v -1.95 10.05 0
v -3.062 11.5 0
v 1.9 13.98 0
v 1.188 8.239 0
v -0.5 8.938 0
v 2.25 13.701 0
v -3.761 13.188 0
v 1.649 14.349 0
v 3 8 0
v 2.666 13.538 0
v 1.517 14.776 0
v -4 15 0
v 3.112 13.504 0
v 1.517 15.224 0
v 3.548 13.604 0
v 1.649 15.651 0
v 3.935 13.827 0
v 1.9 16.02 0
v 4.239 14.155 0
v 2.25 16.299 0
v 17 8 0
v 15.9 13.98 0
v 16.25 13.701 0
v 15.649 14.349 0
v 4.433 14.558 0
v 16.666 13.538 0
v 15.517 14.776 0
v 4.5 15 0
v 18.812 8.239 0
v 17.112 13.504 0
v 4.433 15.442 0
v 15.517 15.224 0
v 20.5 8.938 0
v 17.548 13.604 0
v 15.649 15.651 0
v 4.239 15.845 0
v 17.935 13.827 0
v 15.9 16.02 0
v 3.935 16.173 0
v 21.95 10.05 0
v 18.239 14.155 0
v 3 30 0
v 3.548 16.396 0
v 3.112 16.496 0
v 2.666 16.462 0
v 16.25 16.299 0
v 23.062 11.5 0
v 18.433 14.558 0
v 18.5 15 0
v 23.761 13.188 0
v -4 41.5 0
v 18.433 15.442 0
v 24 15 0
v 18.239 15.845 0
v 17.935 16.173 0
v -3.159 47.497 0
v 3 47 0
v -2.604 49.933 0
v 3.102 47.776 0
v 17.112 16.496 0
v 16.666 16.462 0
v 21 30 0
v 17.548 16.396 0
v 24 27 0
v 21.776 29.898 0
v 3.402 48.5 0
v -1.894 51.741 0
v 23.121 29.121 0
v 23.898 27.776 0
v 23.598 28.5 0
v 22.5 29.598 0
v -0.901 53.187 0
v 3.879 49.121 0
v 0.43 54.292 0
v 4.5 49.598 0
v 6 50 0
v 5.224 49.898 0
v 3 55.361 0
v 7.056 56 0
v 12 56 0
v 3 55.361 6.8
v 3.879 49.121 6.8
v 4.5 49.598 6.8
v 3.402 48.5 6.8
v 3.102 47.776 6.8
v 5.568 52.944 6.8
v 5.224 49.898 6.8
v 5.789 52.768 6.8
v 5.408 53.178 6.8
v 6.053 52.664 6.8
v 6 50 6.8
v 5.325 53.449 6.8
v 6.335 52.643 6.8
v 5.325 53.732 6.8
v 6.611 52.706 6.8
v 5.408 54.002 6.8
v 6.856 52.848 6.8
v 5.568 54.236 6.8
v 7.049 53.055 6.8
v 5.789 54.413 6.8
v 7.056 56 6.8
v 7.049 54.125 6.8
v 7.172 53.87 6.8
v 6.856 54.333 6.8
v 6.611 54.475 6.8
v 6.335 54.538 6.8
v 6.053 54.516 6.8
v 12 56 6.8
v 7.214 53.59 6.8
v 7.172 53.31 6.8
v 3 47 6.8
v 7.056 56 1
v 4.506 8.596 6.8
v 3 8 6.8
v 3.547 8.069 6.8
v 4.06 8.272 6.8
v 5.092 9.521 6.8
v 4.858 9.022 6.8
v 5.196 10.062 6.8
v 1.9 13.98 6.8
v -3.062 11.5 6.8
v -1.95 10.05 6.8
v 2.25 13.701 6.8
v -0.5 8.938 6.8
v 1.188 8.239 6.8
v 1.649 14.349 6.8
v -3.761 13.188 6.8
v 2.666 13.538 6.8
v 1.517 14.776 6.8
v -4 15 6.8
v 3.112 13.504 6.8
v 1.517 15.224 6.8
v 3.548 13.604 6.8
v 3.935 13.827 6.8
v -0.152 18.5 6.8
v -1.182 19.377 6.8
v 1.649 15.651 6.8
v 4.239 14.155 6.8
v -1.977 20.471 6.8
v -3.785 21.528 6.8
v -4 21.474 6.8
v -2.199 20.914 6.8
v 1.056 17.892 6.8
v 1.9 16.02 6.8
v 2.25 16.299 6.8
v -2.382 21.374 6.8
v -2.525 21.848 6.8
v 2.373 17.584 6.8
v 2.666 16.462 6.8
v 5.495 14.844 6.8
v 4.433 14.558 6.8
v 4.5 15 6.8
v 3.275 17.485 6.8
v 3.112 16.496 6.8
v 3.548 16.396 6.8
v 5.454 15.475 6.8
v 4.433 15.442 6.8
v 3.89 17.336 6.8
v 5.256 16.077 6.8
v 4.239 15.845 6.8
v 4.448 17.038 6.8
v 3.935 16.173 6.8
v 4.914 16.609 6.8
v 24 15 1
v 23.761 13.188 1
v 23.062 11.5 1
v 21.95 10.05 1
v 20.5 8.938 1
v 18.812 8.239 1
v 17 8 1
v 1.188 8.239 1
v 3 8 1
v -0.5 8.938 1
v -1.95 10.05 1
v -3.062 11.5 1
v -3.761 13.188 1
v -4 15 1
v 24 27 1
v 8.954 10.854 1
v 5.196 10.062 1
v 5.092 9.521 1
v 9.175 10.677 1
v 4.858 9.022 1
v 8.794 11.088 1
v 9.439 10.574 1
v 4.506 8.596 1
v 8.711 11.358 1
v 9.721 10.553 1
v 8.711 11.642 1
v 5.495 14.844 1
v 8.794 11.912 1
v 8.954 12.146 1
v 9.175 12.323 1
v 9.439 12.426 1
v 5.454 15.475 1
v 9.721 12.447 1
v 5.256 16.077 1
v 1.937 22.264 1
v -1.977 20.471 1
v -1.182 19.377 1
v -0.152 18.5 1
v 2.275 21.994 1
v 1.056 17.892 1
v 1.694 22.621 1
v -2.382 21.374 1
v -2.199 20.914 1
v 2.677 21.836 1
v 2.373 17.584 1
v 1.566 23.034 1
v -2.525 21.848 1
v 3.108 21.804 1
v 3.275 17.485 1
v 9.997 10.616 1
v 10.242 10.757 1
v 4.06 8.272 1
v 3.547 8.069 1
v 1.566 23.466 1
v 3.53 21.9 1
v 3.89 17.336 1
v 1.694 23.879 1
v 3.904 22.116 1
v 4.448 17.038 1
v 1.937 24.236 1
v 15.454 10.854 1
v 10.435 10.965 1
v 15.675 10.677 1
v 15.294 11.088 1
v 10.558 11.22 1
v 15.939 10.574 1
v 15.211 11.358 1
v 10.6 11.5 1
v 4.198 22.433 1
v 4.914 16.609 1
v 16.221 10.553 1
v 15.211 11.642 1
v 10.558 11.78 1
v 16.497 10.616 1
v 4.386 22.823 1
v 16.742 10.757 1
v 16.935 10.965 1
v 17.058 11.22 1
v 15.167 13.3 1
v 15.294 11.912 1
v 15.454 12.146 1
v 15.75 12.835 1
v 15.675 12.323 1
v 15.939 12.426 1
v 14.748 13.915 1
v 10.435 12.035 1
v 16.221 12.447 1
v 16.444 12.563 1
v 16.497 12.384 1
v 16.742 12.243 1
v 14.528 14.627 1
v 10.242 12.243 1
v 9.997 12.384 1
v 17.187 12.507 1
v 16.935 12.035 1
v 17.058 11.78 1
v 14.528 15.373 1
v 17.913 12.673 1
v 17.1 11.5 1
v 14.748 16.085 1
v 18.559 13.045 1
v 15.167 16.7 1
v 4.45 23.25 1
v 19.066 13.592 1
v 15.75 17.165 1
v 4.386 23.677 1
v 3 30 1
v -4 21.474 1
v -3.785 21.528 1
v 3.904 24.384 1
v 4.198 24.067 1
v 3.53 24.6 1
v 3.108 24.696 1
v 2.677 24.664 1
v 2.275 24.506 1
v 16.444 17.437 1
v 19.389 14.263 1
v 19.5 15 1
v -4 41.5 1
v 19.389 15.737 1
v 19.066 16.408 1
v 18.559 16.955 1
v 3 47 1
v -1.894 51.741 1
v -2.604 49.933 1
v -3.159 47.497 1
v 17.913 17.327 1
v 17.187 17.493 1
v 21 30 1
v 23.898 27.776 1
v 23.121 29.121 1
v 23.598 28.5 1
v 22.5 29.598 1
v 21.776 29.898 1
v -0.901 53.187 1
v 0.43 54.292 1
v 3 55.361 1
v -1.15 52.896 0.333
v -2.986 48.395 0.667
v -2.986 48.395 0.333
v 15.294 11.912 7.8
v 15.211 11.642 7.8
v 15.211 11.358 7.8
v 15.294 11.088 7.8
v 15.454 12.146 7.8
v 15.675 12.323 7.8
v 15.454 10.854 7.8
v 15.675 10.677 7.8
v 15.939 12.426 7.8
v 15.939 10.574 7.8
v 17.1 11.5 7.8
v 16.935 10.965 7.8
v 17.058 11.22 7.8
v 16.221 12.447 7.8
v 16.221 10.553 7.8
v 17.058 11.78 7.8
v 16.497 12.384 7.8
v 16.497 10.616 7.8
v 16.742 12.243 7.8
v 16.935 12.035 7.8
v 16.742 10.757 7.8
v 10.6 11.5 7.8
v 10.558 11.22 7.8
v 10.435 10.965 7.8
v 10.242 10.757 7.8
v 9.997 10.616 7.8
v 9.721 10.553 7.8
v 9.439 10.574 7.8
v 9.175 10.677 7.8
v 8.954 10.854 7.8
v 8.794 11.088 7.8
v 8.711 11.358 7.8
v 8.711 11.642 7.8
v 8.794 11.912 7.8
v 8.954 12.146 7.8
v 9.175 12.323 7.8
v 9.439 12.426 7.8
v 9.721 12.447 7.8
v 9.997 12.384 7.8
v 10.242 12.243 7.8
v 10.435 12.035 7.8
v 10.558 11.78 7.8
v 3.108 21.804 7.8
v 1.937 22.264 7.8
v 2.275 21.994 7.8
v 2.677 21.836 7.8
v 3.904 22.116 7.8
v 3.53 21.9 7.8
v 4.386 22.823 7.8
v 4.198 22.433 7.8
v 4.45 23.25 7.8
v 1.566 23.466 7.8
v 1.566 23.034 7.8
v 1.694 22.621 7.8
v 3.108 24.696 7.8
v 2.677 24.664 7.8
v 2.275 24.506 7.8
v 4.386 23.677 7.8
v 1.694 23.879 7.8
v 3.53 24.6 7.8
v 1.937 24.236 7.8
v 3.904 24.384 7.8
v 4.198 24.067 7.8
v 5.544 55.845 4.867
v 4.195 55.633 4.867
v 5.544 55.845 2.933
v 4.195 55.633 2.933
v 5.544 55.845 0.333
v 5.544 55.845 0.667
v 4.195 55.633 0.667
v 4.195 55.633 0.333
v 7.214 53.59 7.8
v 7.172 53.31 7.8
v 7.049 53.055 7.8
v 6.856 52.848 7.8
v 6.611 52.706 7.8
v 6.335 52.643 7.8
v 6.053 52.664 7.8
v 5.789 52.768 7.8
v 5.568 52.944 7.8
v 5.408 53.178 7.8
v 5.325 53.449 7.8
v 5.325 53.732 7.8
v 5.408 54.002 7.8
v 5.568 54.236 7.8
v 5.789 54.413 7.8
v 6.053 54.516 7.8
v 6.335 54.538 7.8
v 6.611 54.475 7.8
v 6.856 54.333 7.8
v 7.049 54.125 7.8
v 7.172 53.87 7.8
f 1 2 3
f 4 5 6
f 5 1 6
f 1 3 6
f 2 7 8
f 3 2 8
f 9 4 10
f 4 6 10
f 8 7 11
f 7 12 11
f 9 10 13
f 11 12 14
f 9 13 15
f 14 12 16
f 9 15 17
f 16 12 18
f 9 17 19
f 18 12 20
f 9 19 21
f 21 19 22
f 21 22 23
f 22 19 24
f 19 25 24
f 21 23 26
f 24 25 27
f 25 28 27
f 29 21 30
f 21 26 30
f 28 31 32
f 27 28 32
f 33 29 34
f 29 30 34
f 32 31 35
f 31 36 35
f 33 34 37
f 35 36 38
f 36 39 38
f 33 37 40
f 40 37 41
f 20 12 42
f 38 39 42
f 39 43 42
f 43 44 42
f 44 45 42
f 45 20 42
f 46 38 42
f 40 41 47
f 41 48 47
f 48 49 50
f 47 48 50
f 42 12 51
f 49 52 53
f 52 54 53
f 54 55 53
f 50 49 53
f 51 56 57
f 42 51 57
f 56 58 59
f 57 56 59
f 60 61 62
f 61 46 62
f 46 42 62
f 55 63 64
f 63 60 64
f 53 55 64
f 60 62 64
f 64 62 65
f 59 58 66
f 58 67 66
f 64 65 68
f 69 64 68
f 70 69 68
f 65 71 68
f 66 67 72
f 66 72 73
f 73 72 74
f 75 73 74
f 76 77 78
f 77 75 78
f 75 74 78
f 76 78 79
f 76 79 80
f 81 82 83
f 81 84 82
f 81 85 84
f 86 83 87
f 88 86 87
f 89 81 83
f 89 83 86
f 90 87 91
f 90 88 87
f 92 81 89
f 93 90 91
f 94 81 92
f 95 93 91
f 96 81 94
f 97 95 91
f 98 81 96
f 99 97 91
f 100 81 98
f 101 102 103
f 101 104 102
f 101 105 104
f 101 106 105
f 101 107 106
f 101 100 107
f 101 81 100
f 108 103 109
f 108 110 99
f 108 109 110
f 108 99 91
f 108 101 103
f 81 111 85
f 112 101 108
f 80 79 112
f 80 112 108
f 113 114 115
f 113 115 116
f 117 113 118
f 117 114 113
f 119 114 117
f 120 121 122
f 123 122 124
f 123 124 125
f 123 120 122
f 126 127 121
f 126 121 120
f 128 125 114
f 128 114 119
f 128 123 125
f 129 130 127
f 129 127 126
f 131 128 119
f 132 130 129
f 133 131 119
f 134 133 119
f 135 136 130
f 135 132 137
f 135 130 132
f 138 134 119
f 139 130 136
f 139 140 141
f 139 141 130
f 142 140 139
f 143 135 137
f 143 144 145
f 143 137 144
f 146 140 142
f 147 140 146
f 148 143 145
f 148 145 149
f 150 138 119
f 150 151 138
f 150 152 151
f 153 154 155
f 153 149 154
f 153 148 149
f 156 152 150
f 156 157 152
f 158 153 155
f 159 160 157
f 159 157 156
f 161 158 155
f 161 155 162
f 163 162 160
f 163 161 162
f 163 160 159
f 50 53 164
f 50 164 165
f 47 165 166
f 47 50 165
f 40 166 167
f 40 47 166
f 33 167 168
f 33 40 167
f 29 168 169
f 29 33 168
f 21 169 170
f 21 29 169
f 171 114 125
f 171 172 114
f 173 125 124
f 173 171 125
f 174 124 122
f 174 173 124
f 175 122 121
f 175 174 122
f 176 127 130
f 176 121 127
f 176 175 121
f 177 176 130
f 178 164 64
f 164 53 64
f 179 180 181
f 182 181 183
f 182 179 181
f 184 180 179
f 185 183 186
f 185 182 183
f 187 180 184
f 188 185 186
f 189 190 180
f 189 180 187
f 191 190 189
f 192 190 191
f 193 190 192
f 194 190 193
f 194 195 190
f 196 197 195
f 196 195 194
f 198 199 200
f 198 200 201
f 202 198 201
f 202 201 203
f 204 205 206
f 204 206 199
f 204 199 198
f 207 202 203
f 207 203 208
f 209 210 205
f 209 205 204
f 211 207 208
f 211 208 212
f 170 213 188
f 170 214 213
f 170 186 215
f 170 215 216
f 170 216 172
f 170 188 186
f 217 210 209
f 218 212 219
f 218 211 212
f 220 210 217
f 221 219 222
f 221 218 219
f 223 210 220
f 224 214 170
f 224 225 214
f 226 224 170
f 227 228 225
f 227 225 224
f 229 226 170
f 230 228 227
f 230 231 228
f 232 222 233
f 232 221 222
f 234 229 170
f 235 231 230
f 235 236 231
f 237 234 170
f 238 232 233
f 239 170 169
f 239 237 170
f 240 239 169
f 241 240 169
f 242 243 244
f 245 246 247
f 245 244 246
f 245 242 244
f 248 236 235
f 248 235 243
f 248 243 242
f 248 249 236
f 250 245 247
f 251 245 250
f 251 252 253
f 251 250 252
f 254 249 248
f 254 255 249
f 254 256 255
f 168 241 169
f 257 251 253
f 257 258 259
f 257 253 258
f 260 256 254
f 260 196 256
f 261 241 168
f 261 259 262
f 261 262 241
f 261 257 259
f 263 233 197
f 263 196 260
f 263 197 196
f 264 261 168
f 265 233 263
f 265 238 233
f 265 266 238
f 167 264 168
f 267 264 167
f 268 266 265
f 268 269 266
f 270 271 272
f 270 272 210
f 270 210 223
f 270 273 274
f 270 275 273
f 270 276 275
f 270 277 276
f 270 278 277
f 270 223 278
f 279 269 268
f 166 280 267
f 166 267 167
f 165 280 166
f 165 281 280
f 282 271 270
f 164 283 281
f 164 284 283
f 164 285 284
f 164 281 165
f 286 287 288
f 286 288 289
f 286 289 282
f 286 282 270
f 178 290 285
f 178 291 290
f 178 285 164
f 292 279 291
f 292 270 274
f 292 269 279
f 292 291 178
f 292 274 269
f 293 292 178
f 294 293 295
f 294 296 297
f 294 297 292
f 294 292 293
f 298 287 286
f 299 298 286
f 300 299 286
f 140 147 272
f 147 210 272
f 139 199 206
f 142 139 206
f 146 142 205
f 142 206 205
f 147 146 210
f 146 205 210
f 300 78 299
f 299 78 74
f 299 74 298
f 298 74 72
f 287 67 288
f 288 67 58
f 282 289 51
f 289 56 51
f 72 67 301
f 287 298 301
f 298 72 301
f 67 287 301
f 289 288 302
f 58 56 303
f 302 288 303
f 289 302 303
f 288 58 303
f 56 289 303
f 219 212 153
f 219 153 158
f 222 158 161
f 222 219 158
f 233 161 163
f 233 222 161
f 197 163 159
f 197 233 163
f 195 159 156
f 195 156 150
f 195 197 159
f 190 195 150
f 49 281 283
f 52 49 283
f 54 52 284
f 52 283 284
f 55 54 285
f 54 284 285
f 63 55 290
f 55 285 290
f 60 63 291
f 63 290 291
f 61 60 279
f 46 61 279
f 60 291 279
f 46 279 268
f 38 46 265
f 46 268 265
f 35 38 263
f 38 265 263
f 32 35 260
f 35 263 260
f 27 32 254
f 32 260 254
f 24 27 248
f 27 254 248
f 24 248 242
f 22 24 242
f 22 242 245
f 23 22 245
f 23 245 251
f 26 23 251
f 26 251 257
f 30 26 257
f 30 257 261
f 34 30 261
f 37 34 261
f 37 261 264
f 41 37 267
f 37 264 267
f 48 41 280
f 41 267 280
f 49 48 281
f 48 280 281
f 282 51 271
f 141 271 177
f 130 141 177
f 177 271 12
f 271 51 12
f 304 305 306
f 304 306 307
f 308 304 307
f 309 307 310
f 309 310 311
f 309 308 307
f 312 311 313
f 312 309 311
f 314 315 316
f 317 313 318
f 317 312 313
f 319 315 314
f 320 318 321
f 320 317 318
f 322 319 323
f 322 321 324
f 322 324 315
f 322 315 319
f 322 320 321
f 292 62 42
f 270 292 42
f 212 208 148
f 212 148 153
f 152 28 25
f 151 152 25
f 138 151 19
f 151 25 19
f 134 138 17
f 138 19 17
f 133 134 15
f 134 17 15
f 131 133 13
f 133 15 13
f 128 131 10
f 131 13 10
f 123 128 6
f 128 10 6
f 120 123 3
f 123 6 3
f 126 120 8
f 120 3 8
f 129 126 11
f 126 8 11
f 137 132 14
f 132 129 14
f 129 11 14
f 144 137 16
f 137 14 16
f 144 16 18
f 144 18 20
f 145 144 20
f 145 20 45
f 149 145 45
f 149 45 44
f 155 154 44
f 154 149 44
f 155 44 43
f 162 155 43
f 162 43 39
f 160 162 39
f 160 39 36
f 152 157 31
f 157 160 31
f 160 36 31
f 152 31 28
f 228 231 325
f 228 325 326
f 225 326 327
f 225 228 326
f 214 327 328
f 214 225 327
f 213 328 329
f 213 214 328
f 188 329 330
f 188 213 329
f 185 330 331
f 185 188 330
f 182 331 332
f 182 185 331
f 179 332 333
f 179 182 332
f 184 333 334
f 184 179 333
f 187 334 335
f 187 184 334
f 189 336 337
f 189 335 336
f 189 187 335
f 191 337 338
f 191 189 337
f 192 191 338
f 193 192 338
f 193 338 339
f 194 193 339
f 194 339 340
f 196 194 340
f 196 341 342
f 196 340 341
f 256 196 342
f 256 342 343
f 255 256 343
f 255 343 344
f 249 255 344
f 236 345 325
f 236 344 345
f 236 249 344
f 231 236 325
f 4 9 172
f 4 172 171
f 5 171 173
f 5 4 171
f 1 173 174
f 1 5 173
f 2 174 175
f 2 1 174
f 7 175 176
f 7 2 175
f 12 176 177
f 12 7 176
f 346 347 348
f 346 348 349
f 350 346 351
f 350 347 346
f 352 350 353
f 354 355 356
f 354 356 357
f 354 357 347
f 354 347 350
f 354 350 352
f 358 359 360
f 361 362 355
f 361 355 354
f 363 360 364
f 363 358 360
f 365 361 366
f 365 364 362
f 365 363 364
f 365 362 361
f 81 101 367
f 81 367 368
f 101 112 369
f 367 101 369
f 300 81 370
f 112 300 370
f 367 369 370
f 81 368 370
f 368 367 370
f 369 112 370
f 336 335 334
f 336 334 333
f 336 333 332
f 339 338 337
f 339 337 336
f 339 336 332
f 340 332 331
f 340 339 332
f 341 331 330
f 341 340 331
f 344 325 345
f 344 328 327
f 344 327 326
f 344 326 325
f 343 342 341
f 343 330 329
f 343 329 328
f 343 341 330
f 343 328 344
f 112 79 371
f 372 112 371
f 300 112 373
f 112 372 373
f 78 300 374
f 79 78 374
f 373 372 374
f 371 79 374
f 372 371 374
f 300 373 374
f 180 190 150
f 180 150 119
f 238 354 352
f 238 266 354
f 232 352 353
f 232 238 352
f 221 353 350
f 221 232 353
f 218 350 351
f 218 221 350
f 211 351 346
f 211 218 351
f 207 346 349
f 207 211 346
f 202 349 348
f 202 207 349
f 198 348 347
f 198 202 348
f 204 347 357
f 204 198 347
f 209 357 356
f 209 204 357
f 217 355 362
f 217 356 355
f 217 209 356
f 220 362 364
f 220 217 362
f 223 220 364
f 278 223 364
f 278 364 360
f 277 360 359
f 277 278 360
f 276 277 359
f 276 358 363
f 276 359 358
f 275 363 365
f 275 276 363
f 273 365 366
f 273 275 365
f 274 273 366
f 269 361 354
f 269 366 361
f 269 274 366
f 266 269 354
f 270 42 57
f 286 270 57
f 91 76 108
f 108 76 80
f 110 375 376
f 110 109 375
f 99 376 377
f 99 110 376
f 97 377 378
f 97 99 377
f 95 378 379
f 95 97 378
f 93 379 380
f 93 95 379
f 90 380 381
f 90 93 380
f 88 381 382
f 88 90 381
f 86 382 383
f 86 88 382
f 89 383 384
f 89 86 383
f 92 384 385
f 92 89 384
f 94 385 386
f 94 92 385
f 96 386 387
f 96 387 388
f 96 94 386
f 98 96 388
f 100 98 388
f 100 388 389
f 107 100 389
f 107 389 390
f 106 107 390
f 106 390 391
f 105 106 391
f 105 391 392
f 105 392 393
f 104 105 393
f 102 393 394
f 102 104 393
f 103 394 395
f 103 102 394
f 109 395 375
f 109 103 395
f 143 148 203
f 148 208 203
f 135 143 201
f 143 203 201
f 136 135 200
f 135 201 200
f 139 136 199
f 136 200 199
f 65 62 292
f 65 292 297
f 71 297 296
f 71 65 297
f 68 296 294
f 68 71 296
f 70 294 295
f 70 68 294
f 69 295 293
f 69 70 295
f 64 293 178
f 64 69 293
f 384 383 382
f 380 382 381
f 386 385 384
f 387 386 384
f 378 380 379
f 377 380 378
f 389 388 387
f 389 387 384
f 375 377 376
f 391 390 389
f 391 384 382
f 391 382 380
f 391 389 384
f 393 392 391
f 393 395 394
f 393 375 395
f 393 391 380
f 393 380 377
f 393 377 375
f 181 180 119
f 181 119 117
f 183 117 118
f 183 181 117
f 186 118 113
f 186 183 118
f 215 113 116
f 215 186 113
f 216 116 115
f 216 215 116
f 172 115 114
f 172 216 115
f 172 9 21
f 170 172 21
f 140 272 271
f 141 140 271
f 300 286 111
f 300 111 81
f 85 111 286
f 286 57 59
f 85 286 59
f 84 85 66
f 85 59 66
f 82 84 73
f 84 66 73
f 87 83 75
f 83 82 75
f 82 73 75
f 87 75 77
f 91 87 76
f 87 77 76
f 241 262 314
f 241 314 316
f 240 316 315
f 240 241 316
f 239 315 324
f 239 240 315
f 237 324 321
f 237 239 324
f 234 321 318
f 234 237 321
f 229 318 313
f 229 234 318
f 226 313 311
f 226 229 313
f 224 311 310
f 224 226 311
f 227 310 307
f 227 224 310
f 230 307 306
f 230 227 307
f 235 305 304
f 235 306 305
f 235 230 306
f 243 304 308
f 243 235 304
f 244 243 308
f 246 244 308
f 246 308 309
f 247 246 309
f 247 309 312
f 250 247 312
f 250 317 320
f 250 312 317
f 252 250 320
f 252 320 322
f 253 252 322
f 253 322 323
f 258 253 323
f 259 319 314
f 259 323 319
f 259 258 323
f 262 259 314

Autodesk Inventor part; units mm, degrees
sketch "Эскиз1" plane through (0, 0, 0) normal (0, 0, 1) x (1, 0, 0)
  line L0 (177.53, 10) -> (177.53, -9.022) projected
  line L1 (177.53, -9.022) -> (165.53, -9.022) projected
  line L2 (165.53, -9.022) -> (165.53, 10) projected
  line L3 (165.53, 10) -> (177.53, 10) projected
  line L4 (165.53, -76) -> (165.53, -56.978) projected
  line L5 (165.53, -56.978) -> (177.53, -56.978) projected
  line L6 (177.53, -56.978) -> (177.53, -76) projected
  line L7 (177.53, -76) -> (165.53, -76) projected
  circle A0 centre (170.53, -49.23) radius 1.6 projected
  circle A1 centre (170.53, -16.77) radius 1.6 projected
  line L8 (181.53, -107.5) -> (181.53, 41.5) projected
  spline S0 degree 3 poles (170.4742, 56) (180.336, 55.2175) (180.2172, 51.2995) (181.53, 41.5) knots -0.786777 -0.786777 -0.786777 -0.786777 0 0 0 0 projected
  line L9 (7.0558, 56) -> (170.4742, 56) projected
  spline S1 degree 3 poles (7.0558, 56) (-2.806, 55.2175) (-2.6872, 51.2995) (-4, 41.5) knots -0.786777 -0.786777 -0.786777 -0.786777 0 0 0 0 projected
  line L10 (-4, 41.5) -> (-4, -107.5) projected
  spline S2 degree 3 poles (7.0558, -122) (-2.806, -121.2175) (-2.6872, -117.2995) (-4, -107.5) knots -0.786777 -0.786777 -0.786777 -0.786777 0 0 0 0 projected
  line L11 (170.4742, -122) -> (7.0558, -122) projected
  spline S3 degree 3 poles (170.4742, -122) (180.336, -121.2175) (180.2172, -117.2995) (181.53, -107.5) knots -0.786777 -0.786777 -0.786777 -0.786777 0 0 0 0 projected
  arc A2 (153.53, -93) -> (156.53, -96) centre (156.53, -93) ccw projected
  line L12 (156.53, -96) -> (174.53, -96) projected
  line L13 (174.53, -96) -> (174.53, -113) projected
  arc A3 (171.53, -116) -> (174.53, -113) centre (171.53, -113) ccw projected
  line L14 (171.53, -116) -> (6, -116) projected
  arc A4 (3, -113) -> (6, -116) centre (6, -113) ccw projected
  line L15 (3, -113) -> (3, -96) projected
  line L16 (3, -96) -> (21, -96) projected
  arc A5 (21, -96) -> (24, -93) centre (21, -93) ccw projected
  line L17 (24, -93) -> (24, 27) projected
  arc A6 (24, 27) -> (21, 30) centre (21, 27) ccw projected
  line L18 (21, 30) -> (3, 30) projected
  line L19 (3, 30) -> (3, 47) projected
  arc A7 (6, 50) -> (3, 47) centre (6, 47) ccw projected
  line L20 (6, 50) -> (171.53, 50) projected
  arc A8 (174.53, 47) -> (171.53, 50) centre (171.53, 47) ccw projected
  line L21 (174.53, 30) -> (174.53, 47) projected
  line L22 (174.53, 30) -> (156.53, 30) projected
  arc A9 (156.53, 30) -> (153.53, 27) centre (156.53, 27) ccw projected
  line L23 (153.53, 27) -> (153.53, -93) projected
  circle A10 centre (160.53, -81) radius 1.5 projected
  circle A11 centre (17, -81) radius 1.5 projected
  circle A12 centre (17, -51) radius 1.5 projected
  circle A13 centre (160.53, -51) radius 1.5 projected
  circle A14 centre (3, -81) radius 1.5 projected
  circle A15 centre (3, -51) radius 1.5 projected
  circle A16 centre (174.53, -81) radius 1.5 projected
  circle A17 centre (17, 15) radius 1.5 projected
  circle A18 centre (17, -15) radius 1.5 projected
  circle A19 centre (160.53, -15) radius 1.5 projected
  circle A20 centre (160.53, 15) radius 1.5 projected
  circle A21 centre (3, 15) radius 1.5 projected
  circle A22 centre (174.53, 15) radius 1.5 projected
  circle A23 centre (3, -15) radius 1.5 projected
  arc A24 (56.8183, -29.5099) -> (58.485, -27.5378) centre (56.485, -27.5378) ccw projected
  line L24 (58.485, -27.5378) -> (58.485, 14) projected
  arc A25 (61.485, 17) -> (58.485, 14) centre (61.485, 14) ccw projected
  line L25 (61.485, 17) -> (61.97, 17) projected
  arc A26 (61.97, 17) -> (64.97, 20) centre (61.97, 20) ccw projected
  line L26 (64.97, 27) -> (64.97, 20) projected
  arc A27 (64.97, 27) -> (61.97, 30) centre (61.97, 27) ccw projected
  line L27 (9.6271, 30) -> (61.97, 30) projected
  arc A28 (9.6271, 30) -> (-1.03, 20.7602) centre (9.8286, 19.0018) ccw projected
  line L28 (-1.03, 20.7602) -> (-1.03, 11.499) projected
  arc A29 (-1.03, 11.499) -> (0.1129, 8.6996) centre (2.97, 11.499) ccw projected
  arc A30 (0.97, 6.6) -> (0.1129, 8.6996) centre (-2.03, 6.6) ccw projected
  line L29 (0.97, 6.6) -> (0.97, -72.6) projected
  arc A31 (0.1129, -74.6996) -> (0.97, -72.6) centre (-2.03, -72.6) ccw projected
  arc A32 (0.1129, -74.6996) -> (-1.03, -77.499) centre (2.97, -77.499) ccw projected
  line L30 (-1.03, -77.499) -> (-1.03, -86.7602) projected
  arc A33 (-1.03, -86.7602) -> (9.6271, -96) centre (9.8286, -85.0018) ccw projected
  line L31 (61.97, -96) -> (9.6271, -96) projected
  arc A34 (61.97, -96) -> (64.97, -93) centre (61.97, -93) ccw projected
  line L32 (64.97, -86) -> (64.97, -93) projected
  arc A35 (64.97, -86) -> (61.97, -83) centre (61.97, -86) ccw projected
  line L33 (61.97, -83) -> (61.485, -83) projected
  arc A36 (58.485, -80) -> (61.485, -83) centre (61.485, -80) ccw projected
  line L34 (58.485, -80) -> (58.485, -48.5022) projected
  arc A37 (58.485, -48.5022) -> (56.8183, -46.5301) centre (56.485, -48.5022) ccw projected
  arc A38 (53.485, -45.3303) -> (56.8183, -46.5301) centre (58.485, -36.67) ccw projected
  arc A39 (52.485, -43.5982) -> (53.485, -45.3303) centre (54.485, -43.5982) ccw projected
  line L35 (52.485, -43.5982) -> (52.485, -32.4418) projected
  arc A40 (53.485, -30.7097) -> (52.485, -32.4418) centre (54.485, -32.4418) ccw projected
  arc A41 (56.8183, -29.5099) -> (53.485, -30.7097) centre (58.485, -39.37) ccw projected
  circle A42 centre (3, -81) radius 1.5 projected
  circle A43 centre (3, 15) radius 1.5 projected
  circle A44 centre (58.485, -89.515) radius 1.5 projected
  circle A45 centre (17, -51) radius 1.5 projected
  circle A46 centre (17, -15) radius 1.5 projected
  circle A47 centre (58.485, 23.515) radius 1.5 projected
  circle A48 centre (49.485, 22.73) radius 0.325 projected
  circle A49 centre (48.885, -25.77) radius 0.8 projected
  circle A50 centre (49.385, -32.52) radius 0.5 projected
  circle A51 centre (4.27, -36.27) radius 0.325 projected
  circle A52 centre (28.2, -73.38) radius 0.325 projected
  circle A53 centre (12.77, 15) radius 0.325 projected
  circle A54 centre (55.185, -49.79) radius 0.325 projected
  circle A55 centre (55.185, -4.51) radius 0.325 projected
  circle A56 centre (12.77, 22) radius 0.325 projected
  circle A57 centre (12.77, -88) radius 0.325 projected
  circle A58 centre (4.27, -23.42) radius 0.325 projected
  circle A59 centre (39.385, -40.52) radius 0.85 projected
  circle A60 centre (53.885, -25.77) radius 0.8 projected
  circle A61 centre (8.77, -88) radius 0.325 projected
  circle A62 centre (39.385, -35.52) radius 0.85 projected
  circle A63 centre (28.2, -60.76) radius 0.325 projected
  circle A64 centre (4.27, -47) radius 0.325 projected
  circle A65 centre (45.215, -90) radius 0.325 projected
  circle A66 centre (43.485, 24.73) radius 0.5 projected
  circle A67 centre (55.185, -69.03) radius 0.325 projected
  circle A68 centre (55.185, 15.73) radius 0.325 projected
  circle A69 centre (45.215, -83) radius 0.325 projected
  circle A70 centre (12.77, -81) radius 0.325 projected
  circle A71 centre (4.27, -8.84) radius 0.325 projected
  circle A72 centre (49.385, -43.52) radius 0.5 projected
  circle A73 centre (8.77, 22) radius 0.325 projected
  line L36 (6, 50) -> (12, 56)
  line L37 (3, 47) -> (3, 55.3611)
  circle A74 centre (3, 15) radius 7
  circle A75 centre (17, 15) radius 7
  line L38 (3, 8) -> (17, 8)
  circle A76 centre (3, 15) radius 2.6
  line L39 (3, 17.6) -> (24, 17.6)
  line L40 (5.6, 15) -> (7.6, 15)
  line L41 (7.6, 15) -> (7.6, 17.6)
  line L42 (7.6, 15) -> (7.6, 8)
  line L43 (7.6, 17.6) -> (20.4, 17.6)
  line L44 (20.4, 17.6) -> (20.4, 7.6)
  line L45 (20.4, 7.6) -> (7.6, 7.6)
  line L46 (7.6, 7.6) -> (7.6, 17.6)
  point P0 (0, 0)
  point P1 (23.4992, 17.6)
  point P2 (-4, 15)
  point P3 (10.5008, 17.6)
  point P4 (10, 15)
  point P5 (9.4992, 17.6)
  point P6 (24, 15)
  dimension "d8" = 5.2
  dimension "d15" = 2
  dimension "d16" = 12.8
  dimension "d17" = 10
extrude "Выдавливание1" add sketch "Эскиз1" along normal blind 1 contours L36 A7 L37 S1 L9 | L10 S1 L37 L19 L18 A28 L28 A74 | A74 L28 A29 A30 | A74 L39 A76 L40 L42 A30 A29 L28 | L28 A28 L18 A6 L17 L39 A75 A74 | L39 A75 A74 | A74 L42 L41 L39 | A74 L42 L38 | A75 L38 L42 A74 | A75 L39 L44 | L41 L40 A76 L39 | A75 L39 | A76 | L39 L17 A75 | A75 L44 L39 | A53 | A56 | A73
chamfer "Фаска1" distance 1 angle 45 1 edges at (15.5, 15, 1)
sketch "Эскиз2" plane through (0, 0, 1) normal (0, 0, 1) x (1, 0, 0)
  circle A0 centre (3, 15) radius 1.5 projected
  line L0 (24, 15) -> (24, 27) projected
  arc A1 (24, 27) -> (21, 30) centre (21, 27) ccw projected
  line L1 (21, 30) -> (3, 30) projected
  line L2 (3, 30) -> (3, 47) projected
  arc A2 (6, 50) -> (3, 47) centre (6, 47) ccw projected
  line L3 (6, 50) -> (12, 56) projected
  line L4 (12, 56) -> (7.0558, 56) projected
  line L5 (-4, 41.5) -> (-4, 15) projected
  arc A3 (-4, 15) -> (3, 8) centre (3, 15) ccw projected
  line L6 (3, 8) -> (17, 8) projected
  arc A4 (17, 8) -> (24, 15) centre (17, 15) ccw projected
  circle A5 centre (17, 15) radius 2.5 projected
  line L7 (3, 30) -> (3, 47) projected
  line L8 (3, 47) -> (3, 55.3611)
  arc A6 (6, 50) -> (3, 47) centre (6, 47) ccw projected
  circle A7 centre (3, 15) radius 1.5 projected
  line L9 (4.5, 15) -> (6.5, 15)
  line L10 (6.5, 15) -> (6.5, 16.5)
  line L11 (6.5, 16.5) -> (3, 16.5)
  line L12 (21, 30) -> (3, 30) projected
  line L13 (3, 16.5) -> (3, 30)
  circle A8 centre (3, 23.25) radius 1.6
  line L14 (6.5, 16.5) -> (19.3, 16.5)
  line L15 (19.3, 16.5) -> (19.3, 6.4)
  line L16 (19.3, 6.4) -> (6.5, 6.4)
  line L17 (6.5, 6.4) -> (6.5, 16.5)
  line L18 (19.3, 16.5) -> (19.3, 10)
  line L19 (19.3, 10) -> (19.3, 11.5)
  line L20 (19.3, 11.5) -> (6.5, 11.5)
  line L21 (12.9, 11.5) -> (16.15, 11.5)
  line L22 (16.15, 11.5) -> (9.65, 11.5)
  circle A9 centre (9.65, 11.5) radius 1
  circle A10 centre (16.15, 11.5) radius 1
  line L23 (19.3, 10) -> (6.5, 10)
  line L24 (9.65, 11.5) -> (18.15, 11.5)
  line L25 (18.172, 17.2) -> (6.5, 16.5)
  line L26 (17.4875, 20.5) -> (6.5, 16.5)
  arc A11 (18.1929, 16.5) -> (17.4875, 20.5) centre (6.5, 16.5) ccw
  line L27 (6.5, 16.5) -> (6.5, 16.7)
  line L28 (8.0036, 17.7621) -> (19.1448, 21.3116)
  circle A12 centre (3, 15) radius 2.6
  circle A13 centre (3, 23.25) radius 5.5
  line L29 (8.0036, 17.7621) -> (5.1102, 17.8522)
  line L30 (2.8349, 17.7525) -> (3.7176, 17.499)
  circle A14 centre (3, 23.25) radius 16.2607
  line L31 (6.5, 16.7) -> (18.172, 17.4)
  line L32 (6.5, 16.7) -> (3.7176, 17.499)
  line L33 (4.1923, 17.8808) -> (5.1102, 17.8522)
  line L34 (17.7935, 30) -> (3, 23.25)
  line L35 (3, 23.25) -> (18.9993, 26.1538)
  line L36 (21, 30) -> (3, 30) projected
  line L37 (18.9993, 26.1538) -> (8.3735, 28.8503)
  line L38 (18.9993, 26.1538) -> (3.8431, 30)
  circle A15 centre (3, 23.25) radius 6.75
  point P0 (0, 0)
  dimension "d41" = 11
  dimension "d23" = 2
  dimension "d24" = 3.2
  dimension "d25" = 12.8
  dimension "d26" = 10.1
  dimension "d27" = 6.5
  dimension "d28" = 1.5
  dimension "d29" = 3.25
  dimension "d30" = 6.5
  dimension "d31" = 2
  dimension "d32" = 2
  dimension "d35" = 8.5
  dimension "d39" = 0.2
  dimension "d40" = 5.2
  dimension "d42" = 16.572
  dimension "d44" = 14.239
  dimension "d45" = 24.526
  dimension "d48" = 24.526
sketch "Эскиз3" plane through (0, 0, 1) normal (0, 0, 1) x (1, 0, 0)
  arc A0 (-2.5, 23.25) -> (3, 17.75) centre (3, 23.25) ccw projected
  line L0 (3, 17.75) -> (3, 17.7051) projected
  line L1 (3, 17.7051) -> (6.5, 16.7) projected
  line L2 (6.5, 16.7) -> (18.172, 17.4) projected
  arc A1 (18.172, 17.4) -> (18.9993, 26.1538) centre (3, 23.25) ccw projected
  line L3 (18.9993, 26.1538) -> (4.6603, 29.7926) projected
  arc A2 (4.6603, 29.7926) -> (3, 30) centre (3, 23.25) ccw projected
  line L4 (3, 30) -> (3, 55.3611) projected
  spline S0 degree 3 poles (3, 55.3611) (-2.8051, 53.7936) (-2.8999, 49.7118) (-4, 41.5) knots -0.659309 -0.659309 -0.659309 -0.659309 0 0 0 0 projected
  line L5 (-4, 41.5) -> (-4, 23.25) projected
  line L6 (-4, 23.25) -> (-2.5, 23.25) projected
  circle A3 centre (3, 23.25) radius 1.6 projected
  line L7 (-2.331, 21.8972) -> (-3.7849, 21.5282)
  line L8 (-4, 41.5) -> (-4, 15) projected
  line L9 (-2.331, 21.8972) -> (-4, 21.4736)
  line L10 (-2.331, 21.8972) -> (-2.5249, 21.848)
  circle A4 centre (3, 23.25) radius 5.7
  circle A5 centre (3, 15) radius 2.6 projected
  line L11 (-2.5249, 21.848) -> (0.5844, 14.0383)
  arc A6 (-4, 15) -> (3, 8) centre (3, 15) ccw projected
  line L12 (3, 12.4) -> (3, 8)
  circle A7 centre (3, 10.2) radius 2.2
  line L13 (3, 30) -> (3, 55.3611) projected
  circle A8 centre (3, 15) radius 1.5 projected
  line L14 (24, 15) -> (24, 27) projected
  arc A9 (24, 27) -> (21, 30) centre (21, 27) ccw projected
  line L15 (21, 30) -> (3, 30) projected
  line L16 (3, 30) -> (3, 47) projected
  arc A10 (6, 50) -> (3, 47) centre (6, 47) ccw projected
  line L17 (6, 50) -> (12, 56) projected
  line L18 (12, 56) -> (7.0558, 56) projected
  spline S1 degree 3 poles (7.0558, 56) (-2.806, 55.2175) (-2.6872, 51.2995) (-4, 41.5) knots 0 0 0 0 1 1 1 1 projected
  line L19 (-4, 41.5) -> (-4, 15) projected
  arc A11 (-4, 15) -> (3, 8) centre (3, 15) ccw projected
  line L20 (3, 8) -> (17, 8) projected
  arc A12 (17, 8) -> (24, 15) centre (17, 15) ccw projected
  circle A13 centre (17, 15) radius 2.5 projected
  point P0 (0, 0)
  point P1 (-1.9767, 20.471)
  point P2 (-2.7, 23.25)
  point P3 (3, 8)
  dimension "d49" = 0.2
extrude "Выдавливание2" add sketch "Эскиз3" along normal blind 5.8 contours A4 L11 A5 A7 A6 L8 L9 L7 | S1 L18 L17 A10 L4 | A7 L12 | L12 A7
ref_plane "РабПлоскость2" through (-3.5074, 8.5, 7.8) normal (0, 0, 1) x (1, 0, 0)
sketch "Эскиз4" plane through (0, 0, 1) normal (0, 0, 1) x (1, 0, 0)
  circle A0 centre (17, 15) radius 2.5 projected
  arc A1 (-2.5249, 21.848) -> (-1.9767, 20.471) centre (3, 23.25) ccw projected
  line L0 (-1.9767, 20.471) -> (0.5844, 14.0383) projected
  arc A2 (0.5844, 14.0383) -> (3, 12.4) centre (3, 15) ccw projected
  arc A3 (3, 8) -> (3, 12.4) centre (3, 10.2) ccw projected
  line L1 (3, 8) -> (17, 8) projected
  arc A4 (17, 8) -> (24, 15) centre (17, 15) ccw projected
  line L2 (24, 15) -> (24, 27) projected
  arc A5 (24, 27) -> (21, 30) centre (21, 27) ccw projected
  line L3 (21, 30) -> (3, 30) projected
  line L4 (3, 30) -> (3, 47) projected
  line L5 (3, 47) -> (3, 55.3611) projected
  line L6 (-4, 41.5) -> (-4, 21.4736) projected
  circle A6 centre (3, 15) radius 1.5 projected
  circle A7 centre (3, 23.25) radius 1.6 projected
  circle A8 centre (3, 23.25) radius 1.6
  line L7 (-4, 21.4736) -> (-2.5249, 21.848) projected
  circle A9 centre (3, 23.25) radius 1.45
  point P0 (0, 0)
  dimension "d58" = 2.9
extrude "Выдавливание3" add sketch "Эскиз4" along normal up to surface (6.8 mm away) contours A9
sketch "Эскиз5" plane through (0, 0, 1) normal (0, 0, 1) x (1, 0, 0)
  circle A0 centre (9.65, 11.5) radius 1 projected
  circle A1 centre (16.15, 11.5) radius 1 projected
  circle A2 centre (9.65, 11.5) radius 0.95
  circle A3 centre (16.15, 11.5) radius 0.95
  point P0 (0, 0)
  dimension "d54" = 1.9
  dimension "d55" = 1.9
ref_plane "РабПлоскость1" through (-3.5074, 8.5, 7.8) normal (0, 0, 1) x (1, 0, 0)
extrude "Выдавливание4" add sketch "Эскиз5" along normal up to surface (6.8 mm away) contours A2 | A3
sketch "Эскиз6" plane through (0, 0, 6.8) normal (0, 0, 1) x (1, 0, 0)
  line L0 (3, 47) -> (3, 55.3611) projected
  line L1 (6, 50) -> (12, 56) projected
  line L2 (3, 51.1805) -> (9.5279, 56)
  line L3 (12, 56) -> (7.0558, 56) projected
  circle A0 centre (6.264, 53.5903) radius 0.95
  point P0 (0, 0)
  dimension "d59" = 1.9
ref_plane "РабПлоскость3" through (-3.5074, 8.5, 7.8) normal (0, 0, 1) x (1, 0, 0)
extrude "Выдавливание5" add sketch "Эскиз6" along normal up to surface (1 mm away)
sketch "Эскиз7" plane through (0, 0, 1) normal (0, 0, 1) x (1, 0, 0)
  circle A0 centre (3, 15) radius 2.6 projected
  circle A1 centre (3, 15) radius 2.5
  line L0 (5.4951, 14.8437) -> (5.1957, 10.0625)
  arc A2 (3, 8) -> (3, 12.4) centre (3, 10.2) ccw projected
  circle A3 centre (3, 23.25) radius 1.45 projected
  arc A4 (-2.5249, 21.848) -> (-1.9767, 20.471) centre (3, 23.25) ccw projected
  circle A5 centre (3, 23.25) radius 5.7
  line L1 (2.3734, 17.5845) -> (3.2748, 17.4848)
  circle A6 centre (9.65, 11.5) radius 0.95 projected
  circle A7 centre (16.15, 11.5) radius 0.95 projected
  circle A8 centre (3, 23.25) radius 1.45 projected
  circle A9 centre (17, 15) radius 2.5 projected
  line L2 (3, 47) -> (3, 55.3611) projected
  line L3 (-4, 41.5) -> (-4, 21.4736) projected
  line L4 (-4, 21.4736) -> (-2.5249, 21.848) projected
  arc A10 (-2.5249, 21.848) -> (-1.9767, 20.471) centre (3, 23.25) ccw projected
  line L5 (-1.9767, 20.471) -> (0.5844, 14.0383) projected
  arc A11 (0.5844, 14.0383) -> (3, 12.4) centre (3, 15) ccw projected
  arc A12 (3, 8) -> (3, 12.4) centre (3, 10.2) ccw projected
  line L6 (3, 8) -> (17, 8) projected
  arc A13 (17, 8) -> (24, 15) centre (17, 15) ccw projected
  line L7 (24, 15) -> (24, 27) projected
  arc A14 (24, 27) -> (21, 30) centre (21, 27) ccw projected
  line L8 (21, 30) -> (3, 30) projected
  line L9 (3, 30) -> (3, 47) projected
  circle A15 centre (3, 15) radius 1.5 projected
  point P0 (0, 0)
  point P1 (-1.9767, 20.471)
  dimension "d62" = 5
extrude "Выдавливание6" add sketch "Эскиз7" along normal up to surface (5.8 mm away) contours A0 L1 A1 L0 | L5 A5 L1 A0 | A0 L0 A2 | A1
properties part number "end carp left"
